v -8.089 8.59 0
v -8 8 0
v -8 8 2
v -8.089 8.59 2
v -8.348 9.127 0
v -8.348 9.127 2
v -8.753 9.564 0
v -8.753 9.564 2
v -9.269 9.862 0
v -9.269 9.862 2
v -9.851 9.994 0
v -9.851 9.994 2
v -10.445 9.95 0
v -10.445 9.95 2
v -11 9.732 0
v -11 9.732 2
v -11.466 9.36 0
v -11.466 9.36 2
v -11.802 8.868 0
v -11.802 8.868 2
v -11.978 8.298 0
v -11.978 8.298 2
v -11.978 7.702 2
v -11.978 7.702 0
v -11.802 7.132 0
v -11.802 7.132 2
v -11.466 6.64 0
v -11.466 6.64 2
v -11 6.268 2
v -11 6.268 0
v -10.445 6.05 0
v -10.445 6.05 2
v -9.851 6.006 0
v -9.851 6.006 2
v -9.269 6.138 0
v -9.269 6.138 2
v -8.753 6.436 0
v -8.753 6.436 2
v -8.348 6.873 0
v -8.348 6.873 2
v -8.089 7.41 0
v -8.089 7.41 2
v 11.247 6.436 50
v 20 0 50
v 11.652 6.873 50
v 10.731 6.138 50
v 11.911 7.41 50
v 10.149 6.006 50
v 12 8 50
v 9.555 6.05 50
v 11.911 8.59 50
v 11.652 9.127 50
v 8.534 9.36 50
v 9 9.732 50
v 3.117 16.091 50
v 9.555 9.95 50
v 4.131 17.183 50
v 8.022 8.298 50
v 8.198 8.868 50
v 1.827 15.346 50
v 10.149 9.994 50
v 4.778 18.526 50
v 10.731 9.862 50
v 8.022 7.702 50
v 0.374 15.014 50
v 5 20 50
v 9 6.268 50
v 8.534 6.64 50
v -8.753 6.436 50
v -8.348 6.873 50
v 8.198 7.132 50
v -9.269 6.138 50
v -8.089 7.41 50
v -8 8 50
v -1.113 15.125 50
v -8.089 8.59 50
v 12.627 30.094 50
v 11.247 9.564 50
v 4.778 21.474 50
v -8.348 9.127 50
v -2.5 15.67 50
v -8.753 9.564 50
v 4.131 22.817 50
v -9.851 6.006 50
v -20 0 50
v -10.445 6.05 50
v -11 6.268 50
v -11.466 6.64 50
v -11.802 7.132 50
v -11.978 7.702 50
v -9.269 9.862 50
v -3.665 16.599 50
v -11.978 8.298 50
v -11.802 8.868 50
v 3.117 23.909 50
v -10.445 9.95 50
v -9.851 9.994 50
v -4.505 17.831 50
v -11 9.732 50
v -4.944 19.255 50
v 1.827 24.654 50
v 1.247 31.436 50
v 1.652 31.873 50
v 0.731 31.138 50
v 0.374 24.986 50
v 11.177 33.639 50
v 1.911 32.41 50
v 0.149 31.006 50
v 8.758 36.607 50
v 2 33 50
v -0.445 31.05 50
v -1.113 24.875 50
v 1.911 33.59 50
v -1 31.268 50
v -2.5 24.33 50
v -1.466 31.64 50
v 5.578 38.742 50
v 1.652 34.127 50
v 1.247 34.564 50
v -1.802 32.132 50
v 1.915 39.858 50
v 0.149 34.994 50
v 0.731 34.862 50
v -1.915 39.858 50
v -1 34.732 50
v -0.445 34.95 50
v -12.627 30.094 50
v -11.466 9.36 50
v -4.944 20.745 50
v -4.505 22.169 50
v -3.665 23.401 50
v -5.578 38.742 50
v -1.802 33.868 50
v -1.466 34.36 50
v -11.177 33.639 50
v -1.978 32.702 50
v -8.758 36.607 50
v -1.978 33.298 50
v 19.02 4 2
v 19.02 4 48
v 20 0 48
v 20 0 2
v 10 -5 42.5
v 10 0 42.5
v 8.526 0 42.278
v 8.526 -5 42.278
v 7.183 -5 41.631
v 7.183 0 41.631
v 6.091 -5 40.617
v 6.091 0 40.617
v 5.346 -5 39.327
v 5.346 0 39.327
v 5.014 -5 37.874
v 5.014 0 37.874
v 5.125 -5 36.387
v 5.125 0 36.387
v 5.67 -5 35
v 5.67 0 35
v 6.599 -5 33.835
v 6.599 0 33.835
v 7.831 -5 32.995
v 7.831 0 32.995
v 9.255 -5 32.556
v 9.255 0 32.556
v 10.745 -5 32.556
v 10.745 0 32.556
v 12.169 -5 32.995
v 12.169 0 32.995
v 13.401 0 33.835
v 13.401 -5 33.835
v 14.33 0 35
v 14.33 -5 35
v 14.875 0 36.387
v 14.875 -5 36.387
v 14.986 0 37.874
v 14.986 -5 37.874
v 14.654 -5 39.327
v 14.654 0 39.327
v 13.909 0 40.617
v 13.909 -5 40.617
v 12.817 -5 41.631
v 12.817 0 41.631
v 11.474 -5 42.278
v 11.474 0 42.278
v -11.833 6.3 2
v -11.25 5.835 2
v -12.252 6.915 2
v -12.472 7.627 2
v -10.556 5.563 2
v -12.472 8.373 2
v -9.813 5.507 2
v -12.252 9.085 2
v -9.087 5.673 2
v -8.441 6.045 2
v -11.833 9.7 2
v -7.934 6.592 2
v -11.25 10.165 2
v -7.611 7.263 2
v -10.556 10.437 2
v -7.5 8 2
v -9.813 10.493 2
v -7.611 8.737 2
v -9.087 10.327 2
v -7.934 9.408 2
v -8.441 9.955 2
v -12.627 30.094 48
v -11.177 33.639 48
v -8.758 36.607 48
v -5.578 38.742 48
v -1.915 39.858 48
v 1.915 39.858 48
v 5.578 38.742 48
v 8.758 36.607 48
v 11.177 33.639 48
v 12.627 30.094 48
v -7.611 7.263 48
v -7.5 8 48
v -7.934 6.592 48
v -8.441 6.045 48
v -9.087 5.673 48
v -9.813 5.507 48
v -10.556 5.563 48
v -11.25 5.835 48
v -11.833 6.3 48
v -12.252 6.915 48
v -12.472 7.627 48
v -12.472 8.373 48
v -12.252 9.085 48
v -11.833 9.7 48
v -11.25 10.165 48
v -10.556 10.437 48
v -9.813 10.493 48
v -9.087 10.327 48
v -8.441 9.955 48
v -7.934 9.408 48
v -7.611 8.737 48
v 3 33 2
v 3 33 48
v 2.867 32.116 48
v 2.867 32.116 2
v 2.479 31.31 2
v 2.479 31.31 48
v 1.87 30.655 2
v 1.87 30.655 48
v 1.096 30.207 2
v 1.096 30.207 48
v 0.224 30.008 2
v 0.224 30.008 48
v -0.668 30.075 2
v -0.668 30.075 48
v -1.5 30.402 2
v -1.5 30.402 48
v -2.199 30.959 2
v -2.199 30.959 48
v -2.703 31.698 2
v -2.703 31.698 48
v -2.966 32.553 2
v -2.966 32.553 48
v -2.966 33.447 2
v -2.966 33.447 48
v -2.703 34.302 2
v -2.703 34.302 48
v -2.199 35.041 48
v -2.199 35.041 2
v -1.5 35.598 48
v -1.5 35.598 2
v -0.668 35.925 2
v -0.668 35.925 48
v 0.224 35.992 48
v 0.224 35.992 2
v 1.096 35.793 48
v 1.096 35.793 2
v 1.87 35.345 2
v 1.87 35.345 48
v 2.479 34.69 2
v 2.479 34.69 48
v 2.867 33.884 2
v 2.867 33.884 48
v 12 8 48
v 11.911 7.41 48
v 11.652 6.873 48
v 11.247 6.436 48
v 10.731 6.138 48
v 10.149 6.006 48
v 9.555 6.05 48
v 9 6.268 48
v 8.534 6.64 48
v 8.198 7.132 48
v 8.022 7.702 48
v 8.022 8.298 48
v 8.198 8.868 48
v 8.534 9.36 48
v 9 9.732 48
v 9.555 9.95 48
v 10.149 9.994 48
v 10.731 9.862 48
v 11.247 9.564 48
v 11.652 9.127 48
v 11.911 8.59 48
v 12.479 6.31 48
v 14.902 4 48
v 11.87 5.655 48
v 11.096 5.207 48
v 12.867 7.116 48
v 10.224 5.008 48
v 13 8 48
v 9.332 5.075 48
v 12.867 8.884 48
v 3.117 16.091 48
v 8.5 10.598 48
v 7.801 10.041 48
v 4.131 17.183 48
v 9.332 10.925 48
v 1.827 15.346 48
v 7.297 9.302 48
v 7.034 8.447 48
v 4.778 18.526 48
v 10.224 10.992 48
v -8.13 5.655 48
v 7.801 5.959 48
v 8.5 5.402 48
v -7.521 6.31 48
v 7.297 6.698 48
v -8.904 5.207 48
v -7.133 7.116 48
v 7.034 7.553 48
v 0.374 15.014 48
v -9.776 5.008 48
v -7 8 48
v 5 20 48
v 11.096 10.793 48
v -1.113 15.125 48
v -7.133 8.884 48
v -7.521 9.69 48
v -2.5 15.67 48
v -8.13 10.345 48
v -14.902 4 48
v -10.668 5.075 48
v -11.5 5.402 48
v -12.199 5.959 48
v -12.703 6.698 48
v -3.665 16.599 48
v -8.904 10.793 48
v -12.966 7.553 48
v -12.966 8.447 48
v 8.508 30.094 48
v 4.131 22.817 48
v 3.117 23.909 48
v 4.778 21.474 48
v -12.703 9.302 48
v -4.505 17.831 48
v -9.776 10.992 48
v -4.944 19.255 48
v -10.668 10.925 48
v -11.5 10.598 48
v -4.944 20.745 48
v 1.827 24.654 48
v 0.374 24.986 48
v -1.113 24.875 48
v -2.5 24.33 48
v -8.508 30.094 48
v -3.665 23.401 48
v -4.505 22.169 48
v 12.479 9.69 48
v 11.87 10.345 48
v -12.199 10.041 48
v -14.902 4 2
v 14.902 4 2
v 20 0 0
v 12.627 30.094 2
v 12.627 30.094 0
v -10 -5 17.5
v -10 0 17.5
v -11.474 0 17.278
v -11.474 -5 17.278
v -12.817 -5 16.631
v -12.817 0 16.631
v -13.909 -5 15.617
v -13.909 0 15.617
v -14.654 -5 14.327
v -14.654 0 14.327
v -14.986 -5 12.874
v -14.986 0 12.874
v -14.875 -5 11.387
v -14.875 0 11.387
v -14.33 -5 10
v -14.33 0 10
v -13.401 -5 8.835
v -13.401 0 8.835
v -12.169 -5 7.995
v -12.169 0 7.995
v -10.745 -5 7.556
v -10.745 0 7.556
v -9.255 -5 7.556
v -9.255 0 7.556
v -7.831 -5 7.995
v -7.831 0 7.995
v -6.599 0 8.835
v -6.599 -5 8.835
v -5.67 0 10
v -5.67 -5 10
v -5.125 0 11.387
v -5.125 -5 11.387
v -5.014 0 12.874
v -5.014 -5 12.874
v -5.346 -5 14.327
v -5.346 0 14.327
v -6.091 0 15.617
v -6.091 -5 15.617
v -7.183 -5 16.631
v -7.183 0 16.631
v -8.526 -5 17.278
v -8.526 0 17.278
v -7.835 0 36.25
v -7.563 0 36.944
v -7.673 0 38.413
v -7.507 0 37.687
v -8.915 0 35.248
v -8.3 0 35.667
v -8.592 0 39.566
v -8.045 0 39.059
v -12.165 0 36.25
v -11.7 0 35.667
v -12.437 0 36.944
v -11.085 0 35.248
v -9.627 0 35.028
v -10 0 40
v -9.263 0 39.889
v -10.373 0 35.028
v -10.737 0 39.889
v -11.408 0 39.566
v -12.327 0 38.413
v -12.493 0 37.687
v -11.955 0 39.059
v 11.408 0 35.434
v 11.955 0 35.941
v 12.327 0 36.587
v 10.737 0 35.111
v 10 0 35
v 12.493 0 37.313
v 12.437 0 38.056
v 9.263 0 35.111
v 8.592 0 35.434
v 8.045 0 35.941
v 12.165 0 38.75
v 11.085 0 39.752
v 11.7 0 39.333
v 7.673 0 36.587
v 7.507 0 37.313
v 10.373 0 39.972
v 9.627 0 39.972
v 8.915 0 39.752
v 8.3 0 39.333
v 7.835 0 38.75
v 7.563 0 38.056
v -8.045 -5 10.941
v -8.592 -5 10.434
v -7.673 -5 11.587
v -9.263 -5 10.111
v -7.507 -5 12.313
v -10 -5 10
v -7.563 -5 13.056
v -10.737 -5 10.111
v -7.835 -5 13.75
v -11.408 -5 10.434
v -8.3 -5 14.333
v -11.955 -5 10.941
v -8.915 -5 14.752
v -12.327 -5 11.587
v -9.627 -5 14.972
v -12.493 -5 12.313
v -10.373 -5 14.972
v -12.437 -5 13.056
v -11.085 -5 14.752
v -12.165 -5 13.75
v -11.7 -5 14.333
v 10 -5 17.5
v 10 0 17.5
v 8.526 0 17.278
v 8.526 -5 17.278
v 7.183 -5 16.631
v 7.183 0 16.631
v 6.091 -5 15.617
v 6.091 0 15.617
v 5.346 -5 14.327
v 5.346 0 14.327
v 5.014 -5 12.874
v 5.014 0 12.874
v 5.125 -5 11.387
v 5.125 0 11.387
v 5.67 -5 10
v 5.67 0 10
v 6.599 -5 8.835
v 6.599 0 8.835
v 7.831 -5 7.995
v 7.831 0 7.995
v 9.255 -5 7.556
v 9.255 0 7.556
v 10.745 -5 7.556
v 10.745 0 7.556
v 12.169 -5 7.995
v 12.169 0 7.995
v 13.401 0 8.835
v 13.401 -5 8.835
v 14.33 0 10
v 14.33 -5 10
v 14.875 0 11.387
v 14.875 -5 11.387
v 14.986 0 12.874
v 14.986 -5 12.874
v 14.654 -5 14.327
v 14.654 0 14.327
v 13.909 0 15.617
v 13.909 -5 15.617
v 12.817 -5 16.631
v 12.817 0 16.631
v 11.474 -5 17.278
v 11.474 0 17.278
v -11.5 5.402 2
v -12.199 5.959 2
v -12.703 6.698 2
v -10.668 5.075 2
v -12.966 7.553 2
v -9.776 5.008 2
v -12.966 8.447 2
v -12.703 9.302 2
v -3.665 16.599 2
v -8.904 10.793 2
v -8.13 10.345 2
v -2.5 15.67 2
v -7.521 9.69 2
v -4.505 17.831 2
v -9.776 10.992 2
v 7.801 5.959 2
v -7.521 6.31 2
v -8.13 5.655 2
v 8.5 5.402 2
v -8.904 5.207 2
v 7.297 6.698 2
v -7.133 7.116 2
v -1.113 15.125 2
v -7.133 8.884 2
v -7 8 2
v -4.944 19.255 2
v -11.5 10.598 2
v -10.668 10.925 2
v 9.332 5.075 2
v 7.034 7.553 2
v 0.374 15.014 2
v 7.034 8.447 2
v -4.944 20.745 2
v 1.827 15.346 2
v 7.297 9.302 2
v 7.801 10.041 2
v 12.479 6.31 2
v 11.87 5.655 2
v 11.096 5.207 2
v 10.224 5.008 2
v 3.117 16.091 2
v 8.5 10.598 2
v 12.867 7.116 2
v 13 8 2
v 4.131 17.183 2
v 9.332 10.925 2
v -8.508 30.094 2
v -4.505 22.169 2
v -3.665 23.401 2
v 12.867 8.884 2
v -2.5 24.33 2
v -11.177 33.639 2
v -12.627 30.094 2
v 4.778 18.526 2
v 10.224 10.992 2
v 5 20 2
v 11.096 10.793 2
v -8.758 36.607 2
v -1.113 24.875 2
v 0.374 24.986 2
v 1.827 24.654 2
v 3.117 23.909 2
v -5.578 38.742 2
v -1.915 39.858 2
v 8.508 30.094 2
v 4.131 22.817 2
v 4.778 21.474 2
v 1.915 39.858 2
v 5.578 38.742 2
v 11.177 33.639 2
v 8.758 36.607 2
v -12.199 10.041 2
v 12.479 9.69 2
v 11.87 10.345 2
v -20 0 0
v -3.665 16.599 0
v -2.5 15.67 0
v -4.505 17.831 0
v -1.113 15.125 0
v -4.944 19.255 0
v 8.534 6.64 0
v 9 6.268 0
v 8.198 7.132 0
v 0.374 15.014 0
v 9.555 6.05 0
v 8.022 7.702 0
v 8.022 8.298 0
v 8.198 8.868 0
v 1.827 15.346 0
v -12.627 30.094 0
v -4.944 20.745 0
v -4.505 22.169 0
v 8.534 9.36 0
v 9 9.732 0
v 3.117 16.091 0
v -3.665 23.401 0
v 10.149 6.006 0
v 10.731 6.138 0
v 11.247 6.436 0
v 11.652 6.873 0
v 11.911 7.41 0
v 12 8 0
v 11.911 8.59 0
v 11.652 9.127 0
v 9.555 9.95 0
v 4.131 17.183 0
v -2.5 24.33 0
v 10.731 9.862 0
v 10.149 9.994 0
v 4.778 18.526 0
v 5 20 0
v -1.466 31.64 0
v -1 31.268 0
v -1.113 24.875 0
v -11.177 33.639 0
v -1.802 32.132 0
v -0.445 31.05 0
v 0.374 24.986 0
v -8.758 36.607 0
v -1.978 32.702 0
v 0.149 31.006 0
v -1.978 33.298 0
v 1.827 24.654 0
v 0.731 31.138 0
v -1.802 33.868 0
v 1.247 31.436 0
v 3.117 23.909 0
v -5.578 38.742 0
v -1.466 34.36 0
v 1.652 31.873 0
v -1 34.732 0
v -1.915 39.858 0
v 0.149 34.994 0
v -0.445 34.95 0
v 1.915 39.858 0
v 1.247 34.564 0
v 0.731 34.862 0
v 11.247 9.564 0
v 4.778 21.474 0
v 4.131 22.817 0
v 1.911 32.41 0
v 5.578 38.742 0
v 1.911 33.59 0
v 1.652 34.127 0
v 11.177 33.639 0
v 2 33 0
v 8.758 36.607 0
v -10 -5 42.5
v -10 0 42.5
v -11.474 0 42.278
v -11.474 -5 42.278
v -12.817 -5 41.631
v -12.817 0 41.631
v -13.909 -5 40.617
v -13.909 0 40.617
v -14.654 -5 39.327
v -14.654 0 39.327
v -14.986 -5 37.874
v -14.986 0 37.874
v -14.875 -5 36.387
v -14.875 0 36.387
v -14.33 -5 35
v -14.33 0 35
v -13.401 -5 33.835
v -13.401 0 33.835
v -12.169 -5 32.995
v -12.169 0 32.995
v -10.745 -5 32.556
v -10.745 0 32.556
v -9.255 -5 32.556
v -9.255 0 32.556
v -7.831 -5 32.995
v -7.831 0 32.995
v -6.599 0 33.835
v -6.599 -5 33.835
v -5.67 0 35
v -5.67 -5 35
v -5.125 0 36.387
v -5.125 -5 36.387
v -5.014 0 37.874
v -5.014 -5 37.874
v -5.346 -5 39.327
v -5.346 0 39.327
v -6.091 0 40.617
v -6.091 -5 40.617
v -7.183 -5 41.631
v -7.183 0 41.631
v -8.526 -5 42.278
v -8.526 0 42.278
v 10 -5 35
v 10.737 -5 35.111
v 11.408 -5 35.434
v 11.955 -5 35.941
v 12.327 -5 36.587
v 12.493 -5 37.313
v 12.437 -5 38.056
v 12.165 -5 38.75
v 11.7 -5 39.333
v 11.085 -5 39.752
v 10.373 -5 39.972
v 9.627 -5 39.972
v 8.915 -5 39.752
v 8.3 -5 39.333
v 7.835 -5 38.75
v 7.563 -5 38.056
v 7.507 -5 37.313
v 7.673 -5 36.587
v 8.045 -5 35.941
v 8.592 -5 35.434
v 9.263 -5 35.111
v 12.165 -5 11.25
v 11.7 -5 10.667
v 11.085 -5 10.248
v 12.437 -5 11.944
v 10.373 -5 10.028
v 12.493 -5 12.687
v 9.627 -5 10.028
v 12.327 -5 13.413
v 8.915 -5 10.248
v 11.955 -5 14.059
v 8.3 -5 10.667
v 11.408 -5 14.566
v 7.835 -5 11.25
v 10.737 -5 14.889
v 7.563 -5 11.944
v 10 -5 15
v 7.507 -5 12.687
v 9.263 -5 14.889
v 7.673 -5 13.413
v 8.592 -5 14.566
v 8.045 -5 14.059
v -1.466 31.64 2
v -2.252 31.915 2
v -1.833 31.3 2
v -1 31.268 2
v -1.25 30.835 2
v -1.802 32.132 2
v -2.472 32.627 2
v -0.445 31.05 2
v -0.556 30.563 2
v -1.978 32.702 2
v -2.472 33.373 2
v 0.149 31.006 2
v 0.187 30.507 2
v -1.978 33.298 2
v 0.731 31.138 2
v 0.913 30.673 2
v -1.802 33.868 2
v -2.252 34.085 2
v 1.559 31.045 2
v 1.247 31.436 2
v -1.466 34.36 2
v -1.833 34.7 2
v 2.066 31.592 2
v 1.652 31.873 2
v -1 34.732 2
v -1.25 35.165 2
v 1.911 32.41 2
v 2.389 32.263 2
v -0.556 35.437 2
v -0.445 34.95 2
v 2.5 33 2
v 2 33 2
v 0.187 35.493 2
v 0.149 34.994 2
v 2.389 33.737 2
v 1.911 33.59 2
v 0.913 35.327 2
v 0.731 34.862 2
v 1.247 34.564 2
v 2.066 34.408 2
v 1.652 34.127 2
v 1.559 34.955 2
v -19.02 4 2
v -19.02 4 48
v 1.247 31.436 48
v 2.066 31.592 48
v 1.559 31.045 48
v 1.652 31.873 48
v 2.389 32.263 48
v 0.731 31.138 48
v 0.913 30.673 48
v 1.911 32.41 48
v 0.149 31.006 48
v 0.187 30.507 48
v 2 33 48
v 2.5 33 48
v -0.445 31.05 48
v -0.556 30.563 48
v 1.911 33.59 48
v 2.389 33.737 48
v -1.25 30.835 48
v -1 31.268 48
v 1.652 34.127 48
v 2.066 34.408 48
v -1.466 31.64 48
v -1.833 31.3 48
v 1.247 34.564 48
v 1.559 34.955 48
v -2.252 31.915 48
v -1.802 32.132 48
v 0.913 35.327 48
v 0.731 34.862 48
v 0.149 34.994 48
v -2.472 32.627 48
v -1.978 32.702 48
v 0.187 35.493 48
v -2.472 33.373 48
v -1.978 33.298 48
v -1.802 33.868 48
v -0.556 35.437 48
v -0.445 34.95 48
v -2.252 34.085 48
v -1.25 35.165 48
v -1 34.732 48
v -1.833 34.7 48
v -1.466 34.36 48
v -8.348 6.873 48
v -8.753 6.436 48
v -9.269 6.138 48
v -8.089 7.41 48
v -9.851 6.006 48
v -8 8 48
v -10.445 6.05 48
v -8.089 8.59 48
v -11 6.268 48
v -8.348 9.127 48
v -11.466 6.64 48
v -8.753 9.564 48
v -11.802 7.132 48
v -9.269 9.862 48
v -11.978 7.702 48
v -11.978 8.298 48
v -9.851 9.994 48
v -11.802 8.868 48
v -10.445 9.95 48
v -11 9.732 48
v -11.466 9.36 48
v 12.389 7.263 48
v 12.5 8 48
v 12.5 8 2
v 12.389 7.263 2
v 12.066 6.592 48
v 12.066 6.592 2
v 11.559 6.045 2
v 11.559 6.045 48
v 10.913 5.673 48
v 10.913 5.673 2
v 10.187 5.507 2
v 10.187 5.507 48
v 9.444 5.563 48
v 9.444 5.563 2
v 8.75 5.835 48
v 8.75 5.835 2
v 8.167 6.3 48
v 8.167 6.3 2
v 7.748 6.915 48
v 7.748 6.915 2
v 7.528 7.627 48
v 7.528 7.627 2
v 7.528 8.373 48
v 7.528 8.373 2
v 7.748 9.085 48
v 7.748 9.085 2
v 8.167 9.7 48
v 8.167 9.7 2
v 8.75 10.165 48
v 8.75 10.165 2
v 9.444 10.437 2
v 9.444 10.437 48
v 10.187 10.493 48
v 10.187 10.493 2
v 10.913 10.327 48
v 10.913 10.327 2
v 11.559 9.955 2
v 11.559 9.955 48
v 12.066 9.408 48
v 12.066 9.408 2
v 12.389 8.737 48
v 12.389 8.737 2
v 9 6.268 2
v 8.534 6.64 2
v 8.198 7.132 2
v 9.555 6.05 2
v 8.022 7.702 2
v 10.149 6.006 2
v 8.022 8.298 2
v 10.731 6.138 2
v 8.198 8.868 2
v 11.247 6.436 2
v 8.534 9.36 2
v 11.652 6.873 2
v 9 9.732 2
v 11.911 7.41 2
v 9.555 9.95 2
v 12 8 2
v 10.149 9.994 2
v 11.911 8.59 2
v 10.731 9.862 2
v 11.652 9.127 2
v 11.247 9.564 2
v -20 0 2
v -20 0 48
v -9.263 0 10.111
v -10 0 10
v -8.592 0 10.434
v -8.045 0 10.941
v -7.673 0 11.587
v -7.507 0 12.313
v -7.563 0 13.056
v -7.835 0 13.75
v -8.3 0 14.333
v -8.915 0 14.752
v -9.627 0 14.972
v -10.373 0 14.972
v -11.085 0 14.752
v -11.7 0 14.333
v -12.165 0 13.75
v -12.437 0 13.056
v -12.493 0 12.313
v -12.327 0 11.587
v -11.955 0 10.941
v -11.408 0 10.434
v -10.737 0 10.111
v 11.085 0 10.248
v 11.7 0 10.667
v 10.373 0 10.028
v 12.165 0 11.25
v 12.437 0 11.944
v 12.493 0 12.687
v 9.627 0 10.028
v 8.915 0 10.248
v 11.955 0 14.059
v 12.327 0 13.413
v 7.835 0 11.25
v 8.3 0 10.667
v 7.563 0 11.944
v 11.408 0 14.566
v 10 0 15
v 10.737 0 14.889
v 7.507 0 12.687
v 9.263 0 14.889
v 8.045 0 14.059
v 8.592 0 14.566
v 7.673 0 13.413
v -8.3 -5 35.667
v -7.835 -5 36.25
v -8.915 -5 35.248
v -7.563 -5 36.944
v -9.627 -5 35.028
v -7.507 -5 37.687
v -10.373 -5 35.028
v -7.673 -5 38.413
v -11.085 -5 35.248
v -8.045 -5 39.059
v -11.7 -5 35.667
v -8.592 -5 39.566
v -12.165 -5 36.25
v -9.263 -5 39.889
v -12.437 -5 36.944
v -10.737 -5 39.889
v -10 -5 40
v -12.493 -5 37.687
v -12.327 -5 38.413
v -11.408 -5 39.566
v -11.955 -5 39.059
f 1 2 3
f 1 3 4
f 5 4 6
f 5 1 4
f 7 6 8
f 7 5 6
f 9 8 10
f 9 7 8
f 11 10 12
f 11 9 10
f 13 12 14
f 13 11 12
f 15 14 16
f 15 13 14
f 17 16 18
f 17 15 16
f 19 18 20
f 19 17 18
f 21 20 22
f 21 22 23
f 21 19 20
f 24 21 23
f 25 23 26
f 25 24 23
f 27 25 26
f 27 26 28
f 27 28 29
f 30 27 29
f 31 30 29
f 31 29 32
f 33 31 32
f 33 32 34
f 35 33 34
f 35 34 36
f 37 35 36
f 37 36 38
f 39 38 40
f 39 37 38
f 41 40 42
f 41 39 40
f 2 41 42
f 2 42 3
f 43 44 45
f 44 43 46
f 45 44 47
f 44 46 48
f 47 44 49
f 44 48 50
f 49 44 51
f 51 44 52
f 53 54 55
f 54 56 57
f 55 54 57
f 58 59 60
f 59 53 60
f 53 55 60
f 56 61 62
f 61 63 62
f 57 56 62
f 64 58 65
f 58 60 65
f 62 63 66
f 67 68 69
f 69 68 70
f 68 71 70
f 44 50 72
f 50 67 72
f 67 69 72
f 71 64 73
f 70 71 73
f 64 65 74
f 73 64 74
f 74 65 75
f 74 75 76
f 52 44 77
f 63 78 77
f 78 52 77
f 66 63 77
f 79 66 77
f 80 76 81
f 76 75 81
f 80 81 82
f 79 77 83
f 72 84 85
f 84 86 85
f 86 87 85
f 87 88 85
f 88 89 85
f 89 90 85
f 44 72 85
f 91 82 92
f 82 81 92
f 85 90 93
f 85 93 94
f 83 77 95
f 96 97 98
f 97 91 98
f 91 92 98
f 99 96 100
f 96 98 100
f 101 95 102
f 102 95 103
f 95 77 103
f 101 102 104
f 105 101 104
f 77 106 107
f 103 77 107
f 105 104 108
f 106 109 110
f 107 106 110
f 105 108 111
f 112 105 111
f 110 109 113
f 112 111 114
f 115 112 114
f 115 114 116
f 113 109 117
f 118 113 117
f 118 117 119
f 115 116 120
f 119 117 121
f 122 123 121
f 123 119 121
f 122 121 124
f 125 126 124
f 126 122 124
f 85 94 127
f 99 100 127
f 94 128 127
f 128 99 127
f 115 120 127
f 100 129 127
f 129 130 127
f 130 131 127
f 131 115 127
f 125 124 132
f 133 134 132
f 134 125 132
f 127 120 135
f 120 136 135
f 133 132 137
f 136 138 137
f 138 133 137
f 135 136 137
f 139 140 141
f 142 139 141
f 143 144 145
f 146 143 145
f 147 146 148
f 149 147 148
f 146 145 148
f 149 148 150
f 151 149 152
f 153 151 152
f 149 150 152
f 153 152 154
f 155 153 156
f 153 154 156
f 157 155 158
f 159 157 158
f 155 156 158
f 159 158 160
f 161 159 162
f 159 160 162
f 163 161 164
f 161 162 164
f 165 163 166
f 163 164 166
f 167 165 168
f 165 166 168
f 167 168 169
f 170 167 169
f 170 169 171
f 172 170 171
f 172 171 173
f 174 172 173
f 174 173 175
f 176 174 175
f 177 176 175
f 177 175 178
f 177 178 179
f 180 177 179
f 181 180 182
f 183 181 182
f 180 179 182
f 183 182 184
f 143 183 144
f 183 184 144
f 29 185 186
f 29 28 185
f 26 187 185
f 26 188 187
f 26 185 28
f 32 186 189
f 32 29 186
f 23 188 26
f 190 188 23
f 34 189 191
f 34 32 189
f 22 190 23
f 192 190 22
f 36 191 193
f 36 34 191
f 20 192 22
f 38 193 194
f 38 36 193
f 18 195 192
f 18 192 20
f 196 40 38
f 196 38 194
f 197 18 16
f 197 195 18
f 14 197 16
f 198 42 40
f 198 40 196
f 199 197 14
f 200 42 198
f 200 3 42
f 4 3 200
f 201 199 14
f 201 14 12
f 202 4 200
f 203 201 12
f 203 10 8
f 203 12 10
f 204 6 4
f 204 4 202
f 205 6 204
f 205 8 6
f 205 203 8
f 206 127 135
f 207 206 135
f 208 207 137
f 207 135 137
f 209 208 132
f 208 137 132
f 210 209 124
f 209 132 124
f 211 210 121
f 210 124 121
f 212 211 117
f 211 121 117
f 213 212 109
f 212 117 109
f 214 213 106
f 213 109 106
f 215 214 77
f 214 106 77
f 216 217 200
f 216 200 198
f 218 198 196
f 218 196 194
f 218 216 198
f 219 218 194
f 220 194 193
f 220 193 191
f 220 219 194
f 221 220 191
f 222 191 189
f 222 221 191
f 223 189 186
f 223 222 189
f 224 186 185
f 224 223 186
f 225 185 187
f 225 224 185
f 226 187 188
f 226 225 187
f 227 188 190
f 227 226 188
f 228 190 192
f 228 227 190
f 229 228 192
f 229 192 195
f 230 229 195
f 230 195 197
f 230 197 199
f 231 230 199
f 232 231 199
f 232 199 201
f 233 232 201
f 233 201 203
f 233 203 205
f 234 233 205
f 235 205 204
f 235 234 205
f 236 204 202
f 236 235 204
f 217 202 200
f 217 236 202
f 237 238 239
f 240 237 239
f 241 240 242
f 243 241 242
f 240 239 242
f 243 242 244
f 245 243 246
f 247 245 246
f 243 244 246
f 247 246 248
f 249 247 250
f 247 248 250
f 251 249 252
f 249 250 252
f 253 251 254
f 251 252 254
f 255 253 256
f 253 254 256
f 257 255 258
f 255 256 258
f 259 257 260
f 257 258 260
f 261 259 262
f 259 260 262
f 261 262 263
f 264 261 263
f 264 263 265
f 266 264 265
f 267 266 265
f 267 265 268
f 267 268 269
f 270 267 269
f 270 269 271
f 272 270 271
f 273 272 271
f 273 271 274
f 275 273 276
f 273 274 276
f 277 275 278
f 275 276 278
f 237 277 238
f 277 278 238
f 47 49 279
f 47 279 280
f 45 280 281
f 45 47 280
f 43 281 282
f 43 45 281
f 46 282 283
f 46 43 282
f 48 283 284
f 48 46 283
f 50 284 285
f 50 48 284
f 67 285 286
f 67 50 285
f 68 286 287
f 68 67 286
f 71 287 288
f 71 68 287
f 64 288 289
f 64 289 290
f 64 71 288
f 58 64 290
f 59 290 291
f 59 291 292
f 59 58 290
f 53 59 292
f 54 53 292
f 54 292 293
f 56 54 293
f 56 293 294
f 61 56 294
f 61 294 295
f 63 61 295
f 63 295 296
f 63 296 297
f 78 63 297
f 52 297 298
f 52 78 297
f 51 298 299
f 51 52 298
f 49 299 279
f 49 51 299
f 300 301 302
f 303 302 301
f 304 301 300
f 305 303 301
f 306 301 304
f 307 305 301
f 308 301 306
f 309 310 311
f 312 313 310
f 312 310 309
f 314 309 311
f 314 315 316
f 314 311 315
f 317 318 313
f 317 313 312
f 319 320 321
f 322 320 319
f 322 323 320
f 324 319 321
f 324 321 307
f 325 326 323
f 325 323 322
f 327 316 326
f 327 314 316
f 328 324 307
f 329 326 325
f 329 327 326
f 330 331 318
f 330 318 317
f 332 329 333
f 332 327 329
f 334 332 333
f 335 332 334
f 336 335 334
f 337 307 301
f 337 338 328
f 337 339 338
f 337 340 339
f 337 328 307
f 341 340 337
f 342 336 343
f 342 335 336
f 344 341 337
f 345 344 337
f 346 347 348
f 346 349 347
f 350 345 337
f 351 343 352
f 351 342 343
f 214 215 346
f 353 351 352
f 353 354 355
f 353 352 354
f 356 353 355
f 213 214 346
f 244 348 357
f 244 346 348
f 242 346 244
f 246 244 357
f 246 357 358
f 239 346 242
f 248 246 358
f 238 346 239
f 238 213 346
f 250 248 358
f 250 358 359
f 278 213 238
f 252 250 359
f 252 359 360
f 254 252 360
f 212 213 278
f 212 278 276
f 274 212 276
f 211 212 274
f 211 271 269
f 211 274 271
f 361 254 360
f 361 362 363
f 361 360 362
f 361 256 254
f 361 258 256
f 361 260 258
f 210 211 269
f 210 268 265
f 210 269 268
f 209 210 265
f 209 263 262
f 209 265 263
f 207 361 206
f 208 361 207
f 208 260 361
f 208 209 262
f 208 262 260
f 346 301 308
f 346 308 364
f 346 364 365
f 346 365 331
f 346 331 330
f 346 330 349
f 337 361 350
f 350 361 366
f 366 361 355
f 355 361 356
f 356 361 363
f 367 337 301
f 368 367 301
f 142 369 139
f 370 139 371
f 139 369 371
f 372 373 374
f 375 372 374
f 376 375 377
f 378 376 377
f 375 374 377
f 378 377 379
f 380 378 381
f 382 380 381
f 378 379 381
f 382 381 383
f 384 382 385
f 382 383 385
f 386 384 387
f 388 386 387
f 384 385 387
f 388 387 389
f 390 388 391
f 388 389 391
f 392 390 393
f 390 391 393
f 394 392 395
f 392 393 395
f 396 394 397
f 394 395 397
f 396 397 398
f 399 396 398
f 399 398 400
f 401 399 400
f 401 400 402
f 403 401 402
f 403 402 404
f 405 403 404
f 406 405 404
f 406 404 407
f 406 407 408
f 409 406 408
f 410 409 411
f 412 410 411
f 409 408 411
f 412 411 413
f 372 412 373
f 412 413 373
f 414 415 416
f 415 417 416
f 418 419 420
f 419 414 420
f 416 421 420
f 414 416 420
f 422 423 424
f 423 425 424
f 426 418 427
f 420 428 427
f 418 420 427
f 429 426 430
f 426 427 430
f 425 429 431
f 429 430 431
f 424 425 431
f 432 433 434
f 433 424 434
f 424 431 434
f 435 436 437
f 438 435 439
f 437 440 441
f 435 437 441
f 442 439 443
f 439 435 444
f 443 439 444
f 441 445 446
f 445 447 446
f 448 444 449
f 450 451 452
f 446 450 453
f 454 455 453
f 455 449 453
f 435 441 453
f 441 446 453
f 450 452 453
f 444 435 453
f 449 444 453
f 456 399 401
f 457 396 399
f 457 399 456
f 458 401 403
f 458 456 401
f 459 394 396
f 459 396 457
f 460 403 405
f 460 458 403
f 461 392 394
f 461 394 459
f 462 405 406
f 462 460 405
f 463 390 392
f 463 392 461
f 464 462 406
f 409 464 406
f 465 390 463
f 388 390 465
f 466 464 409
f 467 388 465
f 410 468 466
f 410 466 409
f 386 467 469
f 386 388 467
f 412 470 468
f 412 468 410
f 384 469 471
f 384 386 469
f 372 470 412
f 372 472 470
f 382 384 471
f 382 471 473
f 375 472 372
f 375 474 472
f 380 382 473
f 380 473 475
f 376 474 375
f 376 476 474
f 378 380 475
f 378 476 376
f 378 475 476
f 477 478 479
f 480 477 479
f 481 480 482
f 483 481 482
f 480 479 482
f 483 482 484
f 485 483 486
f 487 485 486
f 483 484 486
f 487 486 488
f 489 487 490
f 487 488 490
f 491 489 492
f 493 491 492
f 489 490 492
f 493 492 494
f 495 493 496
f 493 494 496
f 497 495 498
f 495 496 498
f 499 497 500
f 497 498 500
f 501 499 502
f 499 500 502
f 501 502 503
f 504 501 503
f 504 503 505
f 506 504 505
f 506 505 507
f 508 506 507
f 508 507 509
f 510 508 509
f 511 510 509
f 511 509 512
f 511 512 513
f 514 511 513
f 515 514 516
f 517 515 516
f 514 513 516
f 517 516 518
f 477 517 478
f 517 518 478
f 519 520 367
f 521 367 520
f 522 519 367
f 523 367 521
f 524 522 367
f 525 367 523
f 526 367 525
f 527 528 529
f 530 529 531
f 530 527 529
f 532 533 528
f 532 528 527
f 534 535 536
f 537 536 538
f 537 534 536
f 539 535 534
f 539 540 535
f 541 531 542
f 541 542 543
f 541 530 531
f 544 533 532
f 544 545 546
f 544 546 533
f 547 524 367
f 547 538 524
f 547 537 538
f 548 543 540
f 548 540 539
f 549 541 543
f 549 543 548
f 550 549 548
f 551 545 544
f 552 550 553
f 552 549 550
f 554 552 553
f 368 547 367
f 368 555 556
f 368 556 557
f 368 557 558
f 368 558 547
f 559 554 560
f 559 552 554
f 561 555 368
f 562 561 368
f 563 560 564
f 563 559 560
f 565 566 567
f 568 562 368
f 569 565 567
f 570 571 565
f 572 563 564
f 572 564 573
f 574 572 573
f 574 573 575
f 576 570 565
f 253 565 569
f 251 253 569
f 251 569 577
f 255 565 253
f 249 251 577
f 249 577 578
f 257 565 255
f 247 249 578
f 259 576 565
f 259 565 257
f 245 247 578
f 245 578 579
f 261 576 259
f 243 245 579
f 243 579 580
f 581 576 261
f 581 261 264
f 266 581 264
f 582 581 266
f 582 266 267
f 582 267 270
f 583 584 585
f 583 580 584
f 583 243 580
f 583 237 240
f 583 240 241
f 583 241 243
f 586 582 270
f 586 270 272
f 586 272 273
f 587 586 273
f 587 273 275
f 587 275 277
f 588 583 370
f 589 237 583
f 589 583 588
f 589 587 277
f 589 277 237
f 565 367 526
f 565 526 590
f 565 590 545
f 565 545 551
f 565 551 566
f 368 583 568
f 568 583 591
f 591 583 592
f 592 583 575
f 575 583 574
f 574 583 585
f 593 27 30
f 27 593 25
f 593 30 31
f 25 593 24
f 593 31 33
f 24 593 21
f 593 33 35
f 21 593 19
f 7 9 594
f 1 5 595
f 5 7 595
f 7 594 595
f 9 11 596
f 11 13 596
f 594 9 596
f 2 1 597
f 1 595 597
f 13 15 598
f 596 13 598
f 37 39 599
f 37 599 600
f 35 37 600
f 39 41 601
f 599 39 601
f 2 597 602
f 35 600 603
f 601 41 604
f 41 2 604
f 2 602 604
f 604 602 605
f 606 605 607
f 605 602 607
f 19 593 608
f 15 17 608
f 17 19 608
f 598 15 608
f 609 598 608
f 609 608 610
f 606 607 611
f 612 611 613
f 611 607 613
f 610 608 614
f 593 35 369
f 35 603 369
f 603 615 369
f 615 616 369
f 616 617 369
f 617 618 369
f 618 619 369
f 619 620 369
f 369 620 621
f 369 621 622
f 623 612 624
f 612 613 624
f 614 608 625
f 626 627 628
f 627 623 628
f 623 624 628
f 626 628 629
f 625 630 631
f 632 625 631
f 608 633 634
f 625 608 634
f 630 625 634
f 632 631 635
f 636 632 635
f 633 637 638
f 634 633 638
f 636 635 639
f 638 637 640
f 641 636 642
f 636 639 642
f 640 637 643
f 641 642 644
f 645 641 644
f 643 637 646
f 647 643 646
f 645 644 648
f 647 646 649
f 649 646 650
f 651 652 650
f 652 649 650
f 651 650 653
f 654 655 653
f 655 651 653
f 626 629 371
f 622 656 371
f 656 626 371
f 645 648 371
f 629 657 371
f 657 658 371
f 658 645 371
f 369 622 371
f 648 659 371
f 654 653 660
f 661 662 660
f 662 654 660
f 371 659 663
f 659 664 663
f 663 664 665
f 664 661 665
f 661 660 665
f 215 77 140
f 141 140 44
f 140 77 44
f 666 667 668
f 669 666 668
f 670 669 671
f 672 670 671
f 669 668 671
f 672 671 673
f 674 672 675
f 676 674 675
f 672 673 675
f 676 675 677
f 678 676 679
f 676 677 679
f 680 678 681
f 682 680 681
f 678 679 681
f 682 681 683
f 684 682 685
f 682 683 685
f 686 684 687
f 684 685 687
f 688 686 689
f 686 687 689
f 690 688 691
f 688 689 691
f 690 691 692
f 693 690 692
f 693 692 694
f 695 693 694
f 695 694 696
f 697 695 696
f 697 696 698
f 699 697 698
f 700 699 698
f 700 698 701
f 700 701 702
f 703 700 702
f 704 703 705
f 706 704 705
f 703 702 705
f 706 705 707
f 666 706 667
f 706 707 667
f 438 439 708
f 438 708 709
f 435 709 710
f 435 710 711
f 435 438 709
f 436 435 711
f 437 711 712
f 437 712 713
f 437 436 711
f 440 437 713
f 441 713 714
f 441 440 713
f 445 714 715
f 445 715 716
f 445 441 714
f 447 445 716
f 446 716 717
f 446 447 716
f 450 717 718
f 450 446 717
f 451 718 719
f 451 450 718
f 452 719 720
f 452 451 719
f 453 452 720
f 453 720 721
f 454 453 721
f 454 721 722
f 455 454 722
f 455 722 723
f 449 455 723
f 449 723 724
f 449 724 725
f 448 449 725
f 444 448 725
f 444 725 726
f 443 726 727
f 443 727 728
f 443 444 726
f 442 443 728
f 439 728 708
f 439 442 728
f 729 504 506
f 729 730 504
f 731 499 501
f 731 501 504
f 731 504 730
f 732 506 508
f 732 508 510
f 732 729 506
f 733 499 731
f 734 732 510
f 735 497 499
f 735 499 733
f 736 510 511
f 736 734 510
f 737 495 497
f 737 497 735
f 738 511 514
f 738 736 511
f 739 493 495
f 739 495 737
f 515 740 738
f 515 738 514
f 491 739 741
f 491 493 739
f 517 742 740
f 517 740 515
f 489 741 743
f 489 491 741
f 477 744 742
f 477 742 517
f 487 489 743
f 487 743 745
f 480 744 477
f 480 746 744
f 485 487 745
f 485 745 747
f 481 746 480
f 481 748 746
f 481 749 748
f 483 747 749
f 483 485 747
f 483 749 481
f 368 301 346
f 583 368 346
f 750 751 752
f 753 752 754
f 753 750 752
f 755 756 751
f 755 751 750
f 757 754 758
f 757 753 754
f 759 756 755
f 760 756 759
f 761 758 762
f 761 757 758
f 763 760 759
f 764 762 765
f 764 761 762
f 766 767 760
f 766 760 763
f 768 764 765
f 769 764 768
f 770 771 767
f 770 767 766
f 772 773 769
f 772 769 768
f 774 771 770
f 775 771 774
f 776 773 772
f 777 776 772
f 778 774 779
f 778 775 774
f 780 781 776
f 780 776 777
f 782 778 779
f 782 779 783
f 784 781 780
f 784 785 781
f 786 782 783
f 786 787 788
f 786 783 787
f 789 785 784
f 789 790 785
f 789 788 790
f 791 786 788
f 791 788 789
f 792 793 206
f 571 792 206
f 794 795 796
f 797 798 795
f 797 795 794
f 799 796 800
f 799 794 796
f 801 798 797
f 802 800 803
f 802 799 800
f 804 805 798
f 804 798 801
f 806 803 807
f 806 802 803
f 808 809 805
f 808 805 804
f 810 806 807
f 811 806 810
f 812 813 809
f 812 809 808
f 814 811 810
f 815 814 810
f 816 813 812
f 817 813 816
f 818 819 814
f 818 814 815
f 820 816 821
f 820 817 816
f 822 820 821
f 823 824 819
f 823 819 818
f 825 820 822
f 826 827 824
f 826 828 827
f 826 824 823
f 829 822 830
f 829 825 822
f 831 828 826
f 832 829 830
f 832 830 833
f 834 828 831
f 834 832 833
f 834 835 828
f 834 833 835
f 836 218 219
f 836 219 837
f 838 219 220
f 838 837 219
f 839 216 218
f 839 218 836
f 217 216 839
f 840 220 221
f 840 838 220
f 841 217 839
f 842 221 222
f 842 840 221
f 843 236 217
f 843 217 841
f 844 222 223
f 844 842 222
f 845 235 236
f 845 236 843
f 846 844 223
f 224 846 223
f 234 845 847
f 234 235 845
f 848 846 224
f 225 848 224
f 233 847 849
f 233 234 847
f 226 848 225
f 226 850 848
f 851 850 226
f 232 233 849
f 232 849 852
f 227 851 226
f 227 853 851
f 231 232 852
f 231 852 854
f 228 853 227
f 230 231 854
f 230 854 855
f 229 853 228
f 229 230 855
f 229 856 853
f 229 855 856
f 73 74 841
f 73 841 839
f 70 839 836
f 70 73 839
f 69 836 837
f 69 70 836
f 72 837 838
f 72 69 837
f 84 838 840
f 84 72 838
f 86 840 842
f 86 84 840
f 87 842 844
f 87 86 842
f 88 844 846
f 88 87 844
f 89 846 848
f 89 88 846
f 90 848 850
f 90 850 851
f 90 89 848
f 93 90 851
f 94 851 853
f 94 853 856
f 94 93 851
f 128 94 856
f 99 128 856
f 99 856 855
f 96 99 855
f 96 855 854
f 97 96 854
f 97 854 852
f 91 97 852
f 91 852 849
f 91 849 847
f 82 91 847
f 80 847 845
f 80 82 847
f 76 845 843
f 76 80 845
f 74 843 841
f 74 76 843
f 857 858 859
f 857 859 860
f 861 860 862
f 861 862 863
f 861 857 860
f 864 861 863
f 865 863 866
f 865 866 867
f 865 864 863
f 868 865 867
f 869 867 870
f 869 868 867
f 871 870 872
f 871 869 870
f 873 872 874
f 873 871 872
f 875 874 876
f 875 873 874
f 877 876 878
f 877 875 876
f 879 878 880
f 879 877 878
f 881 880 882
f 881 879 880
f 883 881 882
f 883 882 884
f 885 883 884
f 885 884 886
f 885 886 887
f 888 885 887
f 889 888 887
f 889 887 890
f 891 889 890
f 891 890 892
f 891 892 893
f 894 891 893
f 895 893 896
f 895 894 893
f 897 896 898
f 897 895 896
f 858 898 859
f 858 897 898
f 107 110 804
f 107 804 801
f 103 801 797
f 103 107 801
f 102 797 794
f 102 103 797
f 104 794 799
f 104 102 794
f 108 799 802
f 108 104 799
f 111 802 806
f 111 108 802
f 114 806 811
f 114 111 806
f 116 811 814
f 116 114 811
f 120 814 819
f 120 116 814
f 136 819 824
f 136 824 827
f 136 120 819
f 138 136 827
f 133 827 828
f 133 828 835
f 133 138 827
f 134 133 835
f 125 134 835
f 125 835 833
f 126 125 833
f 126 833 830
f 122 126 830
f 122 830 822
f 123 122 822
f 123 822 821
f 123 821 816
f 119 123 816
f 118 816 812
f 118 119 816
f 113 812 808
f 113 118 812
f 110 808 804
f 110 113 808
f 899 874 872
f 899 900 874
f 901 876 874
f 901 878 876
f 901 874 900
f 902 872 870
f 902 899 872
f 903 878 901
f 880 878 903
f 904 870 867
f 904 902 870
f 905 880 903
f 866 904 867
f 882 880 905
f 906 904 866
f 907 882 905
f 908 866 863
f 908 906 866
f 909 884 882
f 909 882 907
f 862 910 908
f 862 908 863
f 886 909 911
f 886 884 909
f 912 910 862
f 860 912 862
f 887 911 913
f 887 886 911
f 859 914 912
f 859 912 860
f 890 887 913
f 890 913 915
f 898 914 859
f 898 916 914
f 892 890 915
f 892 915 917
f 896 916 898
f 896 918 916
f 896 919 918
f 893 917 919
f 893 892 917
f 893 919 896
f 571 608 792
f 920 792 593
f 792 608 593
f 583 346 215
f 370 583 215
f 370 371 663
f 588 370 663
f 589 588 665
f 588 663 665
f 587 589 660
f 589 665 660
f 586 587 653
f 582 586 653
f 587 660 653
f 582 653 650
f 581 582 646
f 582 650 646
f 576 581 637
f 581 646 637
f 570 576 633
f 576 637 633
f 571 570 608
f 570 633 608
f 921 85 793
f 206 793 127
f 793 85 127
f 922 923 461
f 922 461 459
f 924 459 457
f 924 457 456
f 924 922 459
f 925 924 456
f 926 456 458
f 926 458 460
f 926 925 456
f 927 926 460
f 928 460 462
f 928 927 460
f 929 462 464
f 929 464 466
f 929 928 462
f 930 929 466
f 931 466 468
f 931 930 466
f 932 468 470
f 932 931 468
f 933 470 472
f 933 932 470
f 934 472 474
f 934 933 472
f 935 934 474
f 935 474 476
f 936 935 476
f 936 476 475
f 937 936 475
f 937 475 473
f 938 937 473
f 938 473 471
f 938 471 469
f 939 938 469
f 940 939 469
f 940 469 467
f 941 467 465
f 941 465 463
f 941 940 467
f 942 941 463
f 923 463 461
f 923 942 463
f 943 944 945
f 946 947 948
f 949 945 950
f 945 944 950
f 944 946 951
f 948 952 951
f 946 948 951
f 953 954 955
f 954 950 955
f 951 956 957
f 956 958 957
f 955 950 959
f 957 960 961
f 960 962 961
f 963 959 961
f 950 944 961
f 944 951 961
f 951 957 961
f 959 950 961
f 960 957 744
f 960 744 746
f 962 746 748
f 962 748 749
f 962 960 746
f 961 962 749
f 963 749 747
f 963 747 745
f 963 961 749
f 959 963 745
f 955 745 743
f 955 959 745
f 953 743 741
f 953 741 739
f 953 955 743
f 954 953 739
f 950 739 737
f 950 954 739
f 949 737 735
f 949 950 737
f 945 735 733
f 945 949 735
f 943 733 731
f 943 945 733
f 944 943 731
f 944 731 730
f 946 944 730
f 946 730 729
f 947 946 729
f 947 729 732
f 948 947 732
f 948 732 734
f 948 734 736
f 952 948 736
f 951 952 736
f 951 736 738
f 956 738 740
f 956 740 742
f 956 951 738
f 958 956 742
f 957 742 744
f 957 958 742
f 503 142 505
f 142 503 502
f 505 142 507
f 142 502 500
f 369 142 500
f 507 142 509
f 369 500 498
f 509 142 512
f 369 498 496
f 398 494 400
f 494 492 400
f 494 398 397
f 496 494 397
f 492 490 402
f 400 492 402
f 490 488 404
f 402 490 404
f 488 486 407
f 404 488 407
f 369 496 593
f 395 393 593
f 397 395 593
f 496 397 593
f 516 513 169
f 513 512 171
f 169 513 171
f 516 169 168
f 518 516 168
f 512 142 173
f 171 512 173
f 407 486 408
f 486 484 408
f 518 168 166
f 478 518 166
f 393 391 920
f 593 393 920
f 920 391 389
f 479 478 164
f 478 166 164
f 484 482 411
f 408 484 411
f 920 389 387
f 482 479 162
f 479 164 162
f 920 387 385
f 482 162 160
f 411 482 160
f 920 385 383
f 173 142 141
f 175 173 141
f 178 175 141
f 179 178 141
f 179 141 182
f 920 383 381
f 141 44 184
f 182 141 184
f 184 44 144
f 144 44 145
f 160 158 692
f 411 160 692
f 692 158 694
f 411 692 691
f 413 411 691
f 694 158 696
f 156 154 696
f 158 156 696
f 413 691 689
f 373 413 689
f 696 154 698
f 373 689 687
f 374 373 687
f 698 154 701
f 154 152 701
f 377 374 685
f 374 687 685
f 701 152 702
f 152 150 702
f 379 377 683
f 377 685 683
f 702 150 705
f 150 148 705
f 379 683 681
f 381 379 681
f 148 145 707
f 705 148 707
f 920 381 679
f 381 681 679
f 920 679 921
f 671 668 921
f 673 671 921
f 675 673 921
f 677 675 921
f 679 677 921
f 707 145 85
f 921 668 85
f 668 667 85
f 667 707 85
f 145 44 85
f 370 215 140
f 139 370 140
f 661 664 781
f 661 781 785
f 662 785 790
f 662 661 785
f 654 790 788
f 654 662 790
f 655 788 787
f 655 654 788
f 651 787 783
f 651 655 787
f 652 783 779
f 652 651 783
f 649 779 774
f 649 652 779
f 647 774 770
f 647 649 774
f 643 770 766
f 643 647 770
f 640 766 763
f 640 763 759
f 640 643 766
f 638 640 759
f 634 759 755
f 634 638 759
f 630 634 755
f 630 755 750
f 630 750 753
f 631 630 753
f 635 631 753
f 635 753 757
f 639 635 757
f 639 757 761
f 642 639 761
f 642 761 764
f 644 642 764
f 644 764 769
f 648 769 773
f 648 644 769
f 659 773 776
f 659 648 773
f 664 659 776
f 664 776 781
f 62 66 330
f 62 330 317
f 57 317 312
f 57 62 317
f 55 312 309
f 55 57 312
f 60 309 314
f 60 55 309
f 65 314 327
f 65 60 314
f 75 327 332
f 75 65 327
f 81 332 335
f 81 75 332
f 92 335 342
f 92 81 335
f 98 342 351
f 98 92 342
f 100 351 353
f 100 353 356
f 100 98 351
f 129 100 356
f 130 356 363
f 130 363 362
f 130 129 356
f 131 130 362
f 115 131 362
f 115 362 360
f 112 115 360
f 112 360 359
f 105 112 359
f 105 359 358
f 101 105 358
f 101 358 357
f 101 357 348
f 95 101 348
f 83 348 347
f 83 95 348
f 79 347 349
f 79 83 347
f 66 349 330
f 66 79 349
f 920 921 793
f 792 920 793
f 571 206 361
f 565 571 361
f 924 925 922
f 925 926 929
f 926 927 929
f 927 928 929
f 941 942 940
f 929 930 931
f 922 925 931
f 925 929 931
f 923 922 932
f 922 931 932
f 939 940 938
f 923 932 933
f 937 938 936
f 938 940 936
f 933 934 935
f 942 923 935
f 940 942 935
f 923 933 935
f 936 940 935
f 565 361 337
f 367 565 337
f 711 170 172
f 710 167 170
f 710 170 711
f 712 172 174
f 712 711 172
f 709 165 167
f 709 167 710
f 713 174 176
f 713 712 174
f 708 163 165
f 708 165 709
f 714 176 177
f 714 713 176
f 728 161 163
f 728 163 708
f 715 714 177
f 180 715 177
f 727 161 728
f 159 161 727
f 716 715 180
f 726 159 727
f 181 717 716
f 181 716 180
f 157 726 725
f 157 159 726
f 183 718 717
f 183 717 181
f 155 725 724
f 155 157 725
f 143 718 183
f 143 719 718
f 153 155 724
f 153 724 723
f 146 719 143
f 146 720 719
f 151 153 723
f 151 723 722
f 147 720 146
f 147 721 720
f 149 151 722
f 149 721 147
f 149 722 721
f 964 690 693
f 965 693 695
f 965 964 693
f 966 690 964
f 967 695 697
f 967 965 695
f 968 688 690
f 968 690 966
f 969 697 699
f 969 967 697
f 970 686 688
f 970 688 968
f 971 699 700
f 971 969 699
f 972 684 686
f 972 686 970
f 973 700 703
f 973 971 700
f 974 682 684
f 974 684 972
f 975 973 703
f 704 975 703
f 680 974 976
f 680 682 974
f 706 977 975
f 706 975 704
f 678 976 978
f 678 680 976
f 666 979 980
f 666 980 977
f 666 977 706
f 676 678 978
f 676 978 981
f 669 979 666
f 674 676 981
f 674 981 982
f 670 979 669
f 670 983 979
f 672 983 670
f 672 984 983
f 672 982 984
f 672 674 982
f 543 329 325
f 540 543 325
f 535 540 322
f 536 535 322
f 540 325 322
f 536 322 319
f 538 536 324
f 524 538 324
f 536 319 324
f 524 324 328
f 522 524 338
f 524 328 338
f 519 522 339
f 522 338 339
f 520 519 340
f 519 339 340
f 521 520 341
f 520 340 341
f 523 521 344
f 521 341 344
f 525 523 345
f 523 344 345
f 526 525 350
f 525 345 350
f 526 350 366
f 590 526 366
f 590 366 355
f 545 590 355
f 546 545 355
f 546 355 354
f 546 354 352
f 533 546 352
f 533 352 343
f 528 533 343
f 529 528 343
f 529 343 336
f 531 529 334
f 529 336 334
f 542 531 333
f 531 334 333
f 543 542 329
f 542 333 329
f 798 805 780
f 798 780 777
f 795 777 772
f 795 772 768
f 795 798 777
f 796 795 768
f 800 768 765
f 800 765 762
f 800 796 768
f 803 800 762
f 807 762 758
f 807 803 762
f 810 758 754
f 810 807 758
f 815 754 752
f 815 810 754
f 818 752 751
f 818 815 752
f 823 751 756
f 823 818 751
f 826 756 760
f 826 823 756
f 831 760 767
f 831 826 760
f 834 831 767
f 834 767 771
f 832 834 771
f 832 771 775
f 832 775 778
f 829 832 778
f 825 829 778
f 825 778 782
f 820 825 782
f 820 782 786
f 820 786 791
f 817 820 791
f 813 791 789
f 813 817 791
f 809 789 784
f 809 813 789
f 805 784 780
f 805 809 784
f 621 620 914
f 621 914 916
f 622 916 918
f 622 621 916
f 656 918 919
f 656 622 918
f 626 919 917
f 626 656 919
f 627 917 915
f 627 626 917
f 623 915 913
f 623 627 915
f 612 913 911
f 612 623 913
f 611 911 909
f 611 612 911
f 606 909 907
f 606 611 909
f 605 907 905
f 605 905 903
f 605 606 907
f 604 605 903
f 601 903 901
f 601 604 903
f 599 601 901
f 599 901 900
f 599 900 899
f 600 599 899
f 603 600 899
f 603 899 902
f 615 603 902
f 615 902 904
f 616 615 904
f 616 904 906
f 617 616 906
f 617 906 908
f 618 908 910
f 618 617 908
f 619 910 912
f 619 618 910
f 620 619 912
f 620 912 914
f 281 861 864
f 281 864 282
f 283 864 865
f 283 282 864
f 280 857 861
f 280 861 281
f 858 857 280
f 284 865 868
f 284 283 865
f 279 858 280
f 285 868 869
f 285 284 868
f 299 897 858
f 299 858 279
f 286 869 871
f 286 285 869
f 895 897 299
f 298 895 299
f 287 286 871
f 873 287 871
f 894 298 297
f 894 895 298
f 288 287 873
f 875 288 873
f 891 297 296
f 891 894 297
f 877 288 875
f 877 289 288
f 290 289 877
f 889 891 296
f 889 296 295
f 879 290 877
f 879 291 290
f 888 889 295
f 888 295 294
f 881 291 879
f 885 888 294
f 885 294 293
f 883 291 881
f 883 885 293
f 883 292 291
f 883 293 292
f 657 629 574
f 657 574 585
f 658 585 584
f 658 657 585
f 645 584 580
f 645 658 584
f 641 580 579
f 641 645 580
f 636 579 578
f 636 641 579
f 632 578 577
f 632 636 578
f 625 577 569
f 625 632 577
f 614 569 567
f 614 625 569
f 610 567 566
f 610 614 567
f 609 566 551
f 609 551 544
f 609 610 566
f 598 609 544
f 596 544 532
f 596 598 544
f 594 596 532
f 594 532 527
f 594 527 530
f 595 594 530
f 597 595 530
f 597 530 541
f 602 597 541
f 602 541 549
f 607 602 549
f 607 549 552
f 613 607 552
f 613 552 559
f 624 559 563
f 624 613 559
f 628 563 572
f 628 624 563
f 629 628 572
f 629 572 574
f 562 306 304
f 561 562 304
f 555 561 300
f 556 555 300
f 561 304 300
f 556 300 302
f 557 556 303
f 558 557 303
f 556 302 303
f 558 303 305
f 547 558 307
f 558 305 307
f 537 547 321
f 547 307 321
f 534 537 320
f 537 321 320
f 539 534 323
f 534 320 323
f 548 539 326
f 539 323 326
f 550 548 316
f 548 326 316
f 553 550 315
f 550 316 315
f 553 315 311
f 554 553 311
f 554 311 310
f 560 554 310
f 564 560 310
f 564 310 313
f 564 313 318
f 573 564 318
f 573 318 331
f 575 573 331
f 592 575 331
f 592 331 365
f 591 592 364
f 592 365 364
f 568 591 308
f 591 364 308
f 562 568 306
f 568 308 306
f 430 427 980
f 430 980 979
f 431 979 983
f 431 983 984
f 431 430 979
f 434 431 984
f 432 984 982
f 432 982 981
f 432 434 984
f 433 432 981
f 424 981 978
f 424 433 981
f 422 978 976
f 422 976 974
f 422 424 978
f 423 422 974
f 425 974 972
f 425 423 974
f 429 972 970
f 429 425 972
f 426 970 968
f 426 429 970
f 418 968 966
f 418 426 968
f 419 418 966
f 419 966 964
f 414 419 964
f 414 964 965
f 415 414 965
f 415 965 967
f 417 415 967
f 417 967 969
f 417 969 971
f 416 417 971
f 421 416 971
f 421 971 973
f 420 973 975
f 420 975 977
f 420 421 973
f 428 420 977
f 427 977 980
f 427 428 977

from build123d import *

# Parameters (mm, degrees)
SKETCH1_R           = 5
SKETCH1_R_2         = 2
BOSS_EXTRUDE1_DEPTH = 2
SKETCH2_R           = 5
SKETCH2_R_2         = 2
BOSS_EXTRUDE2_DEPTH = 2
SKETCH4_R           = 3
SKETCH4_R_2         = 2.5
BOSS_EXTRUDE3_DEPTH = 46
BOSS_EXTRUDE4_DEPTH = 46
BOSS_EXTRUDE5_DEPTH = 46
SKETCH9_R           = 5
SKETCH9_R_2         = 2.5
BOSS_EXTRUDE6_DEPTH = 5


with BuildPart() as part:
    # Sketch1 → Boss-Extrude1 (new body)
    with BuildSketch(Plane.XY):
        with BuildLine():
            Line((-20, 0), (20, 0))
            Line((20, 0), (12.626516595, 30.093715997))
            ThreePointArc((12.626516595, 30.093715997), (0, 40), (-12.626516595, 30.093715997))
            Line((-12.626516595, 30.093715997), (-20, 0))
        make_face()
        with Locations((0, 20)):
            Circle(SKETCH1_R, mode=Mode.SUBTRACT)
        with Locations((0, 33)):
            Circle(SKETCH1_R_2, mode=Mode.SUBTRACT)
        with Locations((10, 8)):
            Circle(SKETCH1_R_2, mode=Mode.SUBTRACT)
        with Locations((-10, 8)):
            Circle(SKETCH1_R_2, mode=Mode.SUBTRACT)
    extrude(amount=BOSS_EXTRUDE1_DEPTH)



with BuildPart() as body_2:
    # Sketch2 → Boss-Extrude2 (new body)
    with BuildSketch(Plane(origin=(0, 0, 50), x_dir=(-1, 0, 0), z_dir=(0, 0, -1))):
        with BuildLine():
            Line((-12.626516595, 30.093715997), (-20, 0))
            Line((-20, 0), (20, 0))
            Line((20, 0), (12.626516595, 30.093715997))
            ThreePointArc((12.626516595, 30.093715997), (0, 40), (-12.626516595, 30.093715997))
        make_face()
        with Locations(Location((0, 20, 0), (0, 0, 180))):
            Circle(SKETCH2_R, mode=Mode.SUBTRACT)
        with Locations(Location((0, 33, 0), (0, 0, 180))):
            Circle(SKETCH2_R_2, mode=Mode.SUBTRACT)
        with Locations(Location((10, 8, 0), (0, 0, 180))):
            Circle(SKETCH2_R_2, mode=Mode.SUBTRACT)
        with Locations(Location((-10, 8, 0), (0, 0, 180))):
            Circle(SKETCH2_R_2, mode=Mode.SUBTRACT)
    extrude(amount=BOSS_EXTRUDE2_DEPTH)


with BuildPart() as part_1:
    add(part.part)

    add(body_2.part)  # Boss-Extrude3 merges body 2
    # Sketch4 → Boss-Extrude3 (add)
    # profile 1 of 3: a face of its own
    with BuildSketch(Plane(origin=(0, 0, 48), x_dir=(-1, 0, 0), z_dir=(0, 0, -1))):
        with Locations(Location((10, 8, 0), (0, 0, 180))):
            Circle(SKETCH4_R)
        with Locations(Location((10, 8, 0), (0, 0, 180))):
            Circle(SKETCH4_R_2, mode=Mode.SUBTRACT)
    # profile 2 of 3: a face of its own
    with BuildSketch(Plane(origin=(0, 0, 48), x_dir=(-1, 0, 0), z_dir=(0, 0, -1))):
        with Locations(Location((0, 33, 0), (0, 0, 180))):
            Circle(SKETCH4_R)
        with Locations(Location((0, 33, 0), (0, 0, 180))):
            Circle(SKETCH4_R_2, mode=Mode.SUBTRACT)
    # profile 3 of 3: a face of its own
    with BuildSketch(Plane(origin=(0, 0, 48), x_dir=(-1, 0, 0), z_dir=(0, 0, -1))):
        with Locations(Location((-10, 8, 0), (0, 0, 180))):
            Circle(SKETCH4_R)
        with Locations(Location((-10, 8, 0), (0, 0, 180))):
            Circle(SKETCH4_R_2, mode=Mode.SUBTRACT)
    extrude(amount=BOSS_EXTRUDE3_DEPTH)

    # Sketch5 → Boss-Extrude4 (add)
    with BuildSketch(Plane(origin=(0, 0, 48), x_dir=(-1, 0, 0), z_dir=(0, 0, -1))):
        Polygon((-20, 0), (20, 0), (19.019930486, 4), (-19.019930486, 4), align=None)
    extrude(amount=BOSS_EXTRUDE4_DEPTH)

    # Sketch6 → Boss-Extrude5 (add)
    with BuildSketch(Plane(origin=(0, 0, 48), x_dir=(-1, 0, 0), z_dir=(0, 0, -1))):
        Polygon((19.019930486, 4), (12.626516595, 30.093715997), (8.508199433, 30.093715997), (14.901613323, 4), align=None)
        Polygon((-19.019930486, 4), (-14.901613323, 4), (-8.508199433, 30.093715997), (-12.626516595, 30.093715997), align=None)
    extrude(amount=BOSS_EXTRUDE5_DEPTH)

    # Sketch9 → Boss-Extrude6 (add)
    # profile 1 of 4: a face of its own
    with BuildSketch(Plane.XZ):
        with Locations(Location((-10, 12.5, 0), (0, 0, 90))):
            Circle(SKETCH9_R)
        with Locations(Location((-10, 12.5, 0), (0, 0, 270))):
            Circle(SKETCH9_R_2, mode=Mode.SUBTRACT)
    # profile 2 of 4: a face of its own
    with BuildSketch(Plane.XZ):
        with Locations(Location((-10, 37.5, 0), (0, 0, 90))):
            Circle(SKETCH9_R)
        with Locations(Location((-10, 37.5, 0), (0, 0, 90))):
            Circle(SKETCH9_R_2, mode=Mode.SUBTRACT)
    # profile 3 of 4: a face of its own
    with BuildSketch(Plane.XZ):
        with Locations(Location((10, 12.5, 0), (0, 0, 90))):
            Circle(SKETCH9_R)
        with Locations(Location((10, 12.5, 0), (0, 0, 90))):
            Circle(SKETCH9_R_2, mode=Mode.SUBTRACT)
    # profile 4 of 4: a face of its own
    with BuildSketch(Plane.XZ):
        with Locations(Location((10, 37.5, 0), (0, 0, 90))):
            Circle(SKETCH9_R)
        with Locations(Location((10, 37.5, 0), (0, 0, 270))):
            Circle(SKETCH9_R_2, mode=Mode.SUBTRACT)
    extrude(amount=BOSS_EXTRUDE6_DEPTH)


solid = part_1.part
